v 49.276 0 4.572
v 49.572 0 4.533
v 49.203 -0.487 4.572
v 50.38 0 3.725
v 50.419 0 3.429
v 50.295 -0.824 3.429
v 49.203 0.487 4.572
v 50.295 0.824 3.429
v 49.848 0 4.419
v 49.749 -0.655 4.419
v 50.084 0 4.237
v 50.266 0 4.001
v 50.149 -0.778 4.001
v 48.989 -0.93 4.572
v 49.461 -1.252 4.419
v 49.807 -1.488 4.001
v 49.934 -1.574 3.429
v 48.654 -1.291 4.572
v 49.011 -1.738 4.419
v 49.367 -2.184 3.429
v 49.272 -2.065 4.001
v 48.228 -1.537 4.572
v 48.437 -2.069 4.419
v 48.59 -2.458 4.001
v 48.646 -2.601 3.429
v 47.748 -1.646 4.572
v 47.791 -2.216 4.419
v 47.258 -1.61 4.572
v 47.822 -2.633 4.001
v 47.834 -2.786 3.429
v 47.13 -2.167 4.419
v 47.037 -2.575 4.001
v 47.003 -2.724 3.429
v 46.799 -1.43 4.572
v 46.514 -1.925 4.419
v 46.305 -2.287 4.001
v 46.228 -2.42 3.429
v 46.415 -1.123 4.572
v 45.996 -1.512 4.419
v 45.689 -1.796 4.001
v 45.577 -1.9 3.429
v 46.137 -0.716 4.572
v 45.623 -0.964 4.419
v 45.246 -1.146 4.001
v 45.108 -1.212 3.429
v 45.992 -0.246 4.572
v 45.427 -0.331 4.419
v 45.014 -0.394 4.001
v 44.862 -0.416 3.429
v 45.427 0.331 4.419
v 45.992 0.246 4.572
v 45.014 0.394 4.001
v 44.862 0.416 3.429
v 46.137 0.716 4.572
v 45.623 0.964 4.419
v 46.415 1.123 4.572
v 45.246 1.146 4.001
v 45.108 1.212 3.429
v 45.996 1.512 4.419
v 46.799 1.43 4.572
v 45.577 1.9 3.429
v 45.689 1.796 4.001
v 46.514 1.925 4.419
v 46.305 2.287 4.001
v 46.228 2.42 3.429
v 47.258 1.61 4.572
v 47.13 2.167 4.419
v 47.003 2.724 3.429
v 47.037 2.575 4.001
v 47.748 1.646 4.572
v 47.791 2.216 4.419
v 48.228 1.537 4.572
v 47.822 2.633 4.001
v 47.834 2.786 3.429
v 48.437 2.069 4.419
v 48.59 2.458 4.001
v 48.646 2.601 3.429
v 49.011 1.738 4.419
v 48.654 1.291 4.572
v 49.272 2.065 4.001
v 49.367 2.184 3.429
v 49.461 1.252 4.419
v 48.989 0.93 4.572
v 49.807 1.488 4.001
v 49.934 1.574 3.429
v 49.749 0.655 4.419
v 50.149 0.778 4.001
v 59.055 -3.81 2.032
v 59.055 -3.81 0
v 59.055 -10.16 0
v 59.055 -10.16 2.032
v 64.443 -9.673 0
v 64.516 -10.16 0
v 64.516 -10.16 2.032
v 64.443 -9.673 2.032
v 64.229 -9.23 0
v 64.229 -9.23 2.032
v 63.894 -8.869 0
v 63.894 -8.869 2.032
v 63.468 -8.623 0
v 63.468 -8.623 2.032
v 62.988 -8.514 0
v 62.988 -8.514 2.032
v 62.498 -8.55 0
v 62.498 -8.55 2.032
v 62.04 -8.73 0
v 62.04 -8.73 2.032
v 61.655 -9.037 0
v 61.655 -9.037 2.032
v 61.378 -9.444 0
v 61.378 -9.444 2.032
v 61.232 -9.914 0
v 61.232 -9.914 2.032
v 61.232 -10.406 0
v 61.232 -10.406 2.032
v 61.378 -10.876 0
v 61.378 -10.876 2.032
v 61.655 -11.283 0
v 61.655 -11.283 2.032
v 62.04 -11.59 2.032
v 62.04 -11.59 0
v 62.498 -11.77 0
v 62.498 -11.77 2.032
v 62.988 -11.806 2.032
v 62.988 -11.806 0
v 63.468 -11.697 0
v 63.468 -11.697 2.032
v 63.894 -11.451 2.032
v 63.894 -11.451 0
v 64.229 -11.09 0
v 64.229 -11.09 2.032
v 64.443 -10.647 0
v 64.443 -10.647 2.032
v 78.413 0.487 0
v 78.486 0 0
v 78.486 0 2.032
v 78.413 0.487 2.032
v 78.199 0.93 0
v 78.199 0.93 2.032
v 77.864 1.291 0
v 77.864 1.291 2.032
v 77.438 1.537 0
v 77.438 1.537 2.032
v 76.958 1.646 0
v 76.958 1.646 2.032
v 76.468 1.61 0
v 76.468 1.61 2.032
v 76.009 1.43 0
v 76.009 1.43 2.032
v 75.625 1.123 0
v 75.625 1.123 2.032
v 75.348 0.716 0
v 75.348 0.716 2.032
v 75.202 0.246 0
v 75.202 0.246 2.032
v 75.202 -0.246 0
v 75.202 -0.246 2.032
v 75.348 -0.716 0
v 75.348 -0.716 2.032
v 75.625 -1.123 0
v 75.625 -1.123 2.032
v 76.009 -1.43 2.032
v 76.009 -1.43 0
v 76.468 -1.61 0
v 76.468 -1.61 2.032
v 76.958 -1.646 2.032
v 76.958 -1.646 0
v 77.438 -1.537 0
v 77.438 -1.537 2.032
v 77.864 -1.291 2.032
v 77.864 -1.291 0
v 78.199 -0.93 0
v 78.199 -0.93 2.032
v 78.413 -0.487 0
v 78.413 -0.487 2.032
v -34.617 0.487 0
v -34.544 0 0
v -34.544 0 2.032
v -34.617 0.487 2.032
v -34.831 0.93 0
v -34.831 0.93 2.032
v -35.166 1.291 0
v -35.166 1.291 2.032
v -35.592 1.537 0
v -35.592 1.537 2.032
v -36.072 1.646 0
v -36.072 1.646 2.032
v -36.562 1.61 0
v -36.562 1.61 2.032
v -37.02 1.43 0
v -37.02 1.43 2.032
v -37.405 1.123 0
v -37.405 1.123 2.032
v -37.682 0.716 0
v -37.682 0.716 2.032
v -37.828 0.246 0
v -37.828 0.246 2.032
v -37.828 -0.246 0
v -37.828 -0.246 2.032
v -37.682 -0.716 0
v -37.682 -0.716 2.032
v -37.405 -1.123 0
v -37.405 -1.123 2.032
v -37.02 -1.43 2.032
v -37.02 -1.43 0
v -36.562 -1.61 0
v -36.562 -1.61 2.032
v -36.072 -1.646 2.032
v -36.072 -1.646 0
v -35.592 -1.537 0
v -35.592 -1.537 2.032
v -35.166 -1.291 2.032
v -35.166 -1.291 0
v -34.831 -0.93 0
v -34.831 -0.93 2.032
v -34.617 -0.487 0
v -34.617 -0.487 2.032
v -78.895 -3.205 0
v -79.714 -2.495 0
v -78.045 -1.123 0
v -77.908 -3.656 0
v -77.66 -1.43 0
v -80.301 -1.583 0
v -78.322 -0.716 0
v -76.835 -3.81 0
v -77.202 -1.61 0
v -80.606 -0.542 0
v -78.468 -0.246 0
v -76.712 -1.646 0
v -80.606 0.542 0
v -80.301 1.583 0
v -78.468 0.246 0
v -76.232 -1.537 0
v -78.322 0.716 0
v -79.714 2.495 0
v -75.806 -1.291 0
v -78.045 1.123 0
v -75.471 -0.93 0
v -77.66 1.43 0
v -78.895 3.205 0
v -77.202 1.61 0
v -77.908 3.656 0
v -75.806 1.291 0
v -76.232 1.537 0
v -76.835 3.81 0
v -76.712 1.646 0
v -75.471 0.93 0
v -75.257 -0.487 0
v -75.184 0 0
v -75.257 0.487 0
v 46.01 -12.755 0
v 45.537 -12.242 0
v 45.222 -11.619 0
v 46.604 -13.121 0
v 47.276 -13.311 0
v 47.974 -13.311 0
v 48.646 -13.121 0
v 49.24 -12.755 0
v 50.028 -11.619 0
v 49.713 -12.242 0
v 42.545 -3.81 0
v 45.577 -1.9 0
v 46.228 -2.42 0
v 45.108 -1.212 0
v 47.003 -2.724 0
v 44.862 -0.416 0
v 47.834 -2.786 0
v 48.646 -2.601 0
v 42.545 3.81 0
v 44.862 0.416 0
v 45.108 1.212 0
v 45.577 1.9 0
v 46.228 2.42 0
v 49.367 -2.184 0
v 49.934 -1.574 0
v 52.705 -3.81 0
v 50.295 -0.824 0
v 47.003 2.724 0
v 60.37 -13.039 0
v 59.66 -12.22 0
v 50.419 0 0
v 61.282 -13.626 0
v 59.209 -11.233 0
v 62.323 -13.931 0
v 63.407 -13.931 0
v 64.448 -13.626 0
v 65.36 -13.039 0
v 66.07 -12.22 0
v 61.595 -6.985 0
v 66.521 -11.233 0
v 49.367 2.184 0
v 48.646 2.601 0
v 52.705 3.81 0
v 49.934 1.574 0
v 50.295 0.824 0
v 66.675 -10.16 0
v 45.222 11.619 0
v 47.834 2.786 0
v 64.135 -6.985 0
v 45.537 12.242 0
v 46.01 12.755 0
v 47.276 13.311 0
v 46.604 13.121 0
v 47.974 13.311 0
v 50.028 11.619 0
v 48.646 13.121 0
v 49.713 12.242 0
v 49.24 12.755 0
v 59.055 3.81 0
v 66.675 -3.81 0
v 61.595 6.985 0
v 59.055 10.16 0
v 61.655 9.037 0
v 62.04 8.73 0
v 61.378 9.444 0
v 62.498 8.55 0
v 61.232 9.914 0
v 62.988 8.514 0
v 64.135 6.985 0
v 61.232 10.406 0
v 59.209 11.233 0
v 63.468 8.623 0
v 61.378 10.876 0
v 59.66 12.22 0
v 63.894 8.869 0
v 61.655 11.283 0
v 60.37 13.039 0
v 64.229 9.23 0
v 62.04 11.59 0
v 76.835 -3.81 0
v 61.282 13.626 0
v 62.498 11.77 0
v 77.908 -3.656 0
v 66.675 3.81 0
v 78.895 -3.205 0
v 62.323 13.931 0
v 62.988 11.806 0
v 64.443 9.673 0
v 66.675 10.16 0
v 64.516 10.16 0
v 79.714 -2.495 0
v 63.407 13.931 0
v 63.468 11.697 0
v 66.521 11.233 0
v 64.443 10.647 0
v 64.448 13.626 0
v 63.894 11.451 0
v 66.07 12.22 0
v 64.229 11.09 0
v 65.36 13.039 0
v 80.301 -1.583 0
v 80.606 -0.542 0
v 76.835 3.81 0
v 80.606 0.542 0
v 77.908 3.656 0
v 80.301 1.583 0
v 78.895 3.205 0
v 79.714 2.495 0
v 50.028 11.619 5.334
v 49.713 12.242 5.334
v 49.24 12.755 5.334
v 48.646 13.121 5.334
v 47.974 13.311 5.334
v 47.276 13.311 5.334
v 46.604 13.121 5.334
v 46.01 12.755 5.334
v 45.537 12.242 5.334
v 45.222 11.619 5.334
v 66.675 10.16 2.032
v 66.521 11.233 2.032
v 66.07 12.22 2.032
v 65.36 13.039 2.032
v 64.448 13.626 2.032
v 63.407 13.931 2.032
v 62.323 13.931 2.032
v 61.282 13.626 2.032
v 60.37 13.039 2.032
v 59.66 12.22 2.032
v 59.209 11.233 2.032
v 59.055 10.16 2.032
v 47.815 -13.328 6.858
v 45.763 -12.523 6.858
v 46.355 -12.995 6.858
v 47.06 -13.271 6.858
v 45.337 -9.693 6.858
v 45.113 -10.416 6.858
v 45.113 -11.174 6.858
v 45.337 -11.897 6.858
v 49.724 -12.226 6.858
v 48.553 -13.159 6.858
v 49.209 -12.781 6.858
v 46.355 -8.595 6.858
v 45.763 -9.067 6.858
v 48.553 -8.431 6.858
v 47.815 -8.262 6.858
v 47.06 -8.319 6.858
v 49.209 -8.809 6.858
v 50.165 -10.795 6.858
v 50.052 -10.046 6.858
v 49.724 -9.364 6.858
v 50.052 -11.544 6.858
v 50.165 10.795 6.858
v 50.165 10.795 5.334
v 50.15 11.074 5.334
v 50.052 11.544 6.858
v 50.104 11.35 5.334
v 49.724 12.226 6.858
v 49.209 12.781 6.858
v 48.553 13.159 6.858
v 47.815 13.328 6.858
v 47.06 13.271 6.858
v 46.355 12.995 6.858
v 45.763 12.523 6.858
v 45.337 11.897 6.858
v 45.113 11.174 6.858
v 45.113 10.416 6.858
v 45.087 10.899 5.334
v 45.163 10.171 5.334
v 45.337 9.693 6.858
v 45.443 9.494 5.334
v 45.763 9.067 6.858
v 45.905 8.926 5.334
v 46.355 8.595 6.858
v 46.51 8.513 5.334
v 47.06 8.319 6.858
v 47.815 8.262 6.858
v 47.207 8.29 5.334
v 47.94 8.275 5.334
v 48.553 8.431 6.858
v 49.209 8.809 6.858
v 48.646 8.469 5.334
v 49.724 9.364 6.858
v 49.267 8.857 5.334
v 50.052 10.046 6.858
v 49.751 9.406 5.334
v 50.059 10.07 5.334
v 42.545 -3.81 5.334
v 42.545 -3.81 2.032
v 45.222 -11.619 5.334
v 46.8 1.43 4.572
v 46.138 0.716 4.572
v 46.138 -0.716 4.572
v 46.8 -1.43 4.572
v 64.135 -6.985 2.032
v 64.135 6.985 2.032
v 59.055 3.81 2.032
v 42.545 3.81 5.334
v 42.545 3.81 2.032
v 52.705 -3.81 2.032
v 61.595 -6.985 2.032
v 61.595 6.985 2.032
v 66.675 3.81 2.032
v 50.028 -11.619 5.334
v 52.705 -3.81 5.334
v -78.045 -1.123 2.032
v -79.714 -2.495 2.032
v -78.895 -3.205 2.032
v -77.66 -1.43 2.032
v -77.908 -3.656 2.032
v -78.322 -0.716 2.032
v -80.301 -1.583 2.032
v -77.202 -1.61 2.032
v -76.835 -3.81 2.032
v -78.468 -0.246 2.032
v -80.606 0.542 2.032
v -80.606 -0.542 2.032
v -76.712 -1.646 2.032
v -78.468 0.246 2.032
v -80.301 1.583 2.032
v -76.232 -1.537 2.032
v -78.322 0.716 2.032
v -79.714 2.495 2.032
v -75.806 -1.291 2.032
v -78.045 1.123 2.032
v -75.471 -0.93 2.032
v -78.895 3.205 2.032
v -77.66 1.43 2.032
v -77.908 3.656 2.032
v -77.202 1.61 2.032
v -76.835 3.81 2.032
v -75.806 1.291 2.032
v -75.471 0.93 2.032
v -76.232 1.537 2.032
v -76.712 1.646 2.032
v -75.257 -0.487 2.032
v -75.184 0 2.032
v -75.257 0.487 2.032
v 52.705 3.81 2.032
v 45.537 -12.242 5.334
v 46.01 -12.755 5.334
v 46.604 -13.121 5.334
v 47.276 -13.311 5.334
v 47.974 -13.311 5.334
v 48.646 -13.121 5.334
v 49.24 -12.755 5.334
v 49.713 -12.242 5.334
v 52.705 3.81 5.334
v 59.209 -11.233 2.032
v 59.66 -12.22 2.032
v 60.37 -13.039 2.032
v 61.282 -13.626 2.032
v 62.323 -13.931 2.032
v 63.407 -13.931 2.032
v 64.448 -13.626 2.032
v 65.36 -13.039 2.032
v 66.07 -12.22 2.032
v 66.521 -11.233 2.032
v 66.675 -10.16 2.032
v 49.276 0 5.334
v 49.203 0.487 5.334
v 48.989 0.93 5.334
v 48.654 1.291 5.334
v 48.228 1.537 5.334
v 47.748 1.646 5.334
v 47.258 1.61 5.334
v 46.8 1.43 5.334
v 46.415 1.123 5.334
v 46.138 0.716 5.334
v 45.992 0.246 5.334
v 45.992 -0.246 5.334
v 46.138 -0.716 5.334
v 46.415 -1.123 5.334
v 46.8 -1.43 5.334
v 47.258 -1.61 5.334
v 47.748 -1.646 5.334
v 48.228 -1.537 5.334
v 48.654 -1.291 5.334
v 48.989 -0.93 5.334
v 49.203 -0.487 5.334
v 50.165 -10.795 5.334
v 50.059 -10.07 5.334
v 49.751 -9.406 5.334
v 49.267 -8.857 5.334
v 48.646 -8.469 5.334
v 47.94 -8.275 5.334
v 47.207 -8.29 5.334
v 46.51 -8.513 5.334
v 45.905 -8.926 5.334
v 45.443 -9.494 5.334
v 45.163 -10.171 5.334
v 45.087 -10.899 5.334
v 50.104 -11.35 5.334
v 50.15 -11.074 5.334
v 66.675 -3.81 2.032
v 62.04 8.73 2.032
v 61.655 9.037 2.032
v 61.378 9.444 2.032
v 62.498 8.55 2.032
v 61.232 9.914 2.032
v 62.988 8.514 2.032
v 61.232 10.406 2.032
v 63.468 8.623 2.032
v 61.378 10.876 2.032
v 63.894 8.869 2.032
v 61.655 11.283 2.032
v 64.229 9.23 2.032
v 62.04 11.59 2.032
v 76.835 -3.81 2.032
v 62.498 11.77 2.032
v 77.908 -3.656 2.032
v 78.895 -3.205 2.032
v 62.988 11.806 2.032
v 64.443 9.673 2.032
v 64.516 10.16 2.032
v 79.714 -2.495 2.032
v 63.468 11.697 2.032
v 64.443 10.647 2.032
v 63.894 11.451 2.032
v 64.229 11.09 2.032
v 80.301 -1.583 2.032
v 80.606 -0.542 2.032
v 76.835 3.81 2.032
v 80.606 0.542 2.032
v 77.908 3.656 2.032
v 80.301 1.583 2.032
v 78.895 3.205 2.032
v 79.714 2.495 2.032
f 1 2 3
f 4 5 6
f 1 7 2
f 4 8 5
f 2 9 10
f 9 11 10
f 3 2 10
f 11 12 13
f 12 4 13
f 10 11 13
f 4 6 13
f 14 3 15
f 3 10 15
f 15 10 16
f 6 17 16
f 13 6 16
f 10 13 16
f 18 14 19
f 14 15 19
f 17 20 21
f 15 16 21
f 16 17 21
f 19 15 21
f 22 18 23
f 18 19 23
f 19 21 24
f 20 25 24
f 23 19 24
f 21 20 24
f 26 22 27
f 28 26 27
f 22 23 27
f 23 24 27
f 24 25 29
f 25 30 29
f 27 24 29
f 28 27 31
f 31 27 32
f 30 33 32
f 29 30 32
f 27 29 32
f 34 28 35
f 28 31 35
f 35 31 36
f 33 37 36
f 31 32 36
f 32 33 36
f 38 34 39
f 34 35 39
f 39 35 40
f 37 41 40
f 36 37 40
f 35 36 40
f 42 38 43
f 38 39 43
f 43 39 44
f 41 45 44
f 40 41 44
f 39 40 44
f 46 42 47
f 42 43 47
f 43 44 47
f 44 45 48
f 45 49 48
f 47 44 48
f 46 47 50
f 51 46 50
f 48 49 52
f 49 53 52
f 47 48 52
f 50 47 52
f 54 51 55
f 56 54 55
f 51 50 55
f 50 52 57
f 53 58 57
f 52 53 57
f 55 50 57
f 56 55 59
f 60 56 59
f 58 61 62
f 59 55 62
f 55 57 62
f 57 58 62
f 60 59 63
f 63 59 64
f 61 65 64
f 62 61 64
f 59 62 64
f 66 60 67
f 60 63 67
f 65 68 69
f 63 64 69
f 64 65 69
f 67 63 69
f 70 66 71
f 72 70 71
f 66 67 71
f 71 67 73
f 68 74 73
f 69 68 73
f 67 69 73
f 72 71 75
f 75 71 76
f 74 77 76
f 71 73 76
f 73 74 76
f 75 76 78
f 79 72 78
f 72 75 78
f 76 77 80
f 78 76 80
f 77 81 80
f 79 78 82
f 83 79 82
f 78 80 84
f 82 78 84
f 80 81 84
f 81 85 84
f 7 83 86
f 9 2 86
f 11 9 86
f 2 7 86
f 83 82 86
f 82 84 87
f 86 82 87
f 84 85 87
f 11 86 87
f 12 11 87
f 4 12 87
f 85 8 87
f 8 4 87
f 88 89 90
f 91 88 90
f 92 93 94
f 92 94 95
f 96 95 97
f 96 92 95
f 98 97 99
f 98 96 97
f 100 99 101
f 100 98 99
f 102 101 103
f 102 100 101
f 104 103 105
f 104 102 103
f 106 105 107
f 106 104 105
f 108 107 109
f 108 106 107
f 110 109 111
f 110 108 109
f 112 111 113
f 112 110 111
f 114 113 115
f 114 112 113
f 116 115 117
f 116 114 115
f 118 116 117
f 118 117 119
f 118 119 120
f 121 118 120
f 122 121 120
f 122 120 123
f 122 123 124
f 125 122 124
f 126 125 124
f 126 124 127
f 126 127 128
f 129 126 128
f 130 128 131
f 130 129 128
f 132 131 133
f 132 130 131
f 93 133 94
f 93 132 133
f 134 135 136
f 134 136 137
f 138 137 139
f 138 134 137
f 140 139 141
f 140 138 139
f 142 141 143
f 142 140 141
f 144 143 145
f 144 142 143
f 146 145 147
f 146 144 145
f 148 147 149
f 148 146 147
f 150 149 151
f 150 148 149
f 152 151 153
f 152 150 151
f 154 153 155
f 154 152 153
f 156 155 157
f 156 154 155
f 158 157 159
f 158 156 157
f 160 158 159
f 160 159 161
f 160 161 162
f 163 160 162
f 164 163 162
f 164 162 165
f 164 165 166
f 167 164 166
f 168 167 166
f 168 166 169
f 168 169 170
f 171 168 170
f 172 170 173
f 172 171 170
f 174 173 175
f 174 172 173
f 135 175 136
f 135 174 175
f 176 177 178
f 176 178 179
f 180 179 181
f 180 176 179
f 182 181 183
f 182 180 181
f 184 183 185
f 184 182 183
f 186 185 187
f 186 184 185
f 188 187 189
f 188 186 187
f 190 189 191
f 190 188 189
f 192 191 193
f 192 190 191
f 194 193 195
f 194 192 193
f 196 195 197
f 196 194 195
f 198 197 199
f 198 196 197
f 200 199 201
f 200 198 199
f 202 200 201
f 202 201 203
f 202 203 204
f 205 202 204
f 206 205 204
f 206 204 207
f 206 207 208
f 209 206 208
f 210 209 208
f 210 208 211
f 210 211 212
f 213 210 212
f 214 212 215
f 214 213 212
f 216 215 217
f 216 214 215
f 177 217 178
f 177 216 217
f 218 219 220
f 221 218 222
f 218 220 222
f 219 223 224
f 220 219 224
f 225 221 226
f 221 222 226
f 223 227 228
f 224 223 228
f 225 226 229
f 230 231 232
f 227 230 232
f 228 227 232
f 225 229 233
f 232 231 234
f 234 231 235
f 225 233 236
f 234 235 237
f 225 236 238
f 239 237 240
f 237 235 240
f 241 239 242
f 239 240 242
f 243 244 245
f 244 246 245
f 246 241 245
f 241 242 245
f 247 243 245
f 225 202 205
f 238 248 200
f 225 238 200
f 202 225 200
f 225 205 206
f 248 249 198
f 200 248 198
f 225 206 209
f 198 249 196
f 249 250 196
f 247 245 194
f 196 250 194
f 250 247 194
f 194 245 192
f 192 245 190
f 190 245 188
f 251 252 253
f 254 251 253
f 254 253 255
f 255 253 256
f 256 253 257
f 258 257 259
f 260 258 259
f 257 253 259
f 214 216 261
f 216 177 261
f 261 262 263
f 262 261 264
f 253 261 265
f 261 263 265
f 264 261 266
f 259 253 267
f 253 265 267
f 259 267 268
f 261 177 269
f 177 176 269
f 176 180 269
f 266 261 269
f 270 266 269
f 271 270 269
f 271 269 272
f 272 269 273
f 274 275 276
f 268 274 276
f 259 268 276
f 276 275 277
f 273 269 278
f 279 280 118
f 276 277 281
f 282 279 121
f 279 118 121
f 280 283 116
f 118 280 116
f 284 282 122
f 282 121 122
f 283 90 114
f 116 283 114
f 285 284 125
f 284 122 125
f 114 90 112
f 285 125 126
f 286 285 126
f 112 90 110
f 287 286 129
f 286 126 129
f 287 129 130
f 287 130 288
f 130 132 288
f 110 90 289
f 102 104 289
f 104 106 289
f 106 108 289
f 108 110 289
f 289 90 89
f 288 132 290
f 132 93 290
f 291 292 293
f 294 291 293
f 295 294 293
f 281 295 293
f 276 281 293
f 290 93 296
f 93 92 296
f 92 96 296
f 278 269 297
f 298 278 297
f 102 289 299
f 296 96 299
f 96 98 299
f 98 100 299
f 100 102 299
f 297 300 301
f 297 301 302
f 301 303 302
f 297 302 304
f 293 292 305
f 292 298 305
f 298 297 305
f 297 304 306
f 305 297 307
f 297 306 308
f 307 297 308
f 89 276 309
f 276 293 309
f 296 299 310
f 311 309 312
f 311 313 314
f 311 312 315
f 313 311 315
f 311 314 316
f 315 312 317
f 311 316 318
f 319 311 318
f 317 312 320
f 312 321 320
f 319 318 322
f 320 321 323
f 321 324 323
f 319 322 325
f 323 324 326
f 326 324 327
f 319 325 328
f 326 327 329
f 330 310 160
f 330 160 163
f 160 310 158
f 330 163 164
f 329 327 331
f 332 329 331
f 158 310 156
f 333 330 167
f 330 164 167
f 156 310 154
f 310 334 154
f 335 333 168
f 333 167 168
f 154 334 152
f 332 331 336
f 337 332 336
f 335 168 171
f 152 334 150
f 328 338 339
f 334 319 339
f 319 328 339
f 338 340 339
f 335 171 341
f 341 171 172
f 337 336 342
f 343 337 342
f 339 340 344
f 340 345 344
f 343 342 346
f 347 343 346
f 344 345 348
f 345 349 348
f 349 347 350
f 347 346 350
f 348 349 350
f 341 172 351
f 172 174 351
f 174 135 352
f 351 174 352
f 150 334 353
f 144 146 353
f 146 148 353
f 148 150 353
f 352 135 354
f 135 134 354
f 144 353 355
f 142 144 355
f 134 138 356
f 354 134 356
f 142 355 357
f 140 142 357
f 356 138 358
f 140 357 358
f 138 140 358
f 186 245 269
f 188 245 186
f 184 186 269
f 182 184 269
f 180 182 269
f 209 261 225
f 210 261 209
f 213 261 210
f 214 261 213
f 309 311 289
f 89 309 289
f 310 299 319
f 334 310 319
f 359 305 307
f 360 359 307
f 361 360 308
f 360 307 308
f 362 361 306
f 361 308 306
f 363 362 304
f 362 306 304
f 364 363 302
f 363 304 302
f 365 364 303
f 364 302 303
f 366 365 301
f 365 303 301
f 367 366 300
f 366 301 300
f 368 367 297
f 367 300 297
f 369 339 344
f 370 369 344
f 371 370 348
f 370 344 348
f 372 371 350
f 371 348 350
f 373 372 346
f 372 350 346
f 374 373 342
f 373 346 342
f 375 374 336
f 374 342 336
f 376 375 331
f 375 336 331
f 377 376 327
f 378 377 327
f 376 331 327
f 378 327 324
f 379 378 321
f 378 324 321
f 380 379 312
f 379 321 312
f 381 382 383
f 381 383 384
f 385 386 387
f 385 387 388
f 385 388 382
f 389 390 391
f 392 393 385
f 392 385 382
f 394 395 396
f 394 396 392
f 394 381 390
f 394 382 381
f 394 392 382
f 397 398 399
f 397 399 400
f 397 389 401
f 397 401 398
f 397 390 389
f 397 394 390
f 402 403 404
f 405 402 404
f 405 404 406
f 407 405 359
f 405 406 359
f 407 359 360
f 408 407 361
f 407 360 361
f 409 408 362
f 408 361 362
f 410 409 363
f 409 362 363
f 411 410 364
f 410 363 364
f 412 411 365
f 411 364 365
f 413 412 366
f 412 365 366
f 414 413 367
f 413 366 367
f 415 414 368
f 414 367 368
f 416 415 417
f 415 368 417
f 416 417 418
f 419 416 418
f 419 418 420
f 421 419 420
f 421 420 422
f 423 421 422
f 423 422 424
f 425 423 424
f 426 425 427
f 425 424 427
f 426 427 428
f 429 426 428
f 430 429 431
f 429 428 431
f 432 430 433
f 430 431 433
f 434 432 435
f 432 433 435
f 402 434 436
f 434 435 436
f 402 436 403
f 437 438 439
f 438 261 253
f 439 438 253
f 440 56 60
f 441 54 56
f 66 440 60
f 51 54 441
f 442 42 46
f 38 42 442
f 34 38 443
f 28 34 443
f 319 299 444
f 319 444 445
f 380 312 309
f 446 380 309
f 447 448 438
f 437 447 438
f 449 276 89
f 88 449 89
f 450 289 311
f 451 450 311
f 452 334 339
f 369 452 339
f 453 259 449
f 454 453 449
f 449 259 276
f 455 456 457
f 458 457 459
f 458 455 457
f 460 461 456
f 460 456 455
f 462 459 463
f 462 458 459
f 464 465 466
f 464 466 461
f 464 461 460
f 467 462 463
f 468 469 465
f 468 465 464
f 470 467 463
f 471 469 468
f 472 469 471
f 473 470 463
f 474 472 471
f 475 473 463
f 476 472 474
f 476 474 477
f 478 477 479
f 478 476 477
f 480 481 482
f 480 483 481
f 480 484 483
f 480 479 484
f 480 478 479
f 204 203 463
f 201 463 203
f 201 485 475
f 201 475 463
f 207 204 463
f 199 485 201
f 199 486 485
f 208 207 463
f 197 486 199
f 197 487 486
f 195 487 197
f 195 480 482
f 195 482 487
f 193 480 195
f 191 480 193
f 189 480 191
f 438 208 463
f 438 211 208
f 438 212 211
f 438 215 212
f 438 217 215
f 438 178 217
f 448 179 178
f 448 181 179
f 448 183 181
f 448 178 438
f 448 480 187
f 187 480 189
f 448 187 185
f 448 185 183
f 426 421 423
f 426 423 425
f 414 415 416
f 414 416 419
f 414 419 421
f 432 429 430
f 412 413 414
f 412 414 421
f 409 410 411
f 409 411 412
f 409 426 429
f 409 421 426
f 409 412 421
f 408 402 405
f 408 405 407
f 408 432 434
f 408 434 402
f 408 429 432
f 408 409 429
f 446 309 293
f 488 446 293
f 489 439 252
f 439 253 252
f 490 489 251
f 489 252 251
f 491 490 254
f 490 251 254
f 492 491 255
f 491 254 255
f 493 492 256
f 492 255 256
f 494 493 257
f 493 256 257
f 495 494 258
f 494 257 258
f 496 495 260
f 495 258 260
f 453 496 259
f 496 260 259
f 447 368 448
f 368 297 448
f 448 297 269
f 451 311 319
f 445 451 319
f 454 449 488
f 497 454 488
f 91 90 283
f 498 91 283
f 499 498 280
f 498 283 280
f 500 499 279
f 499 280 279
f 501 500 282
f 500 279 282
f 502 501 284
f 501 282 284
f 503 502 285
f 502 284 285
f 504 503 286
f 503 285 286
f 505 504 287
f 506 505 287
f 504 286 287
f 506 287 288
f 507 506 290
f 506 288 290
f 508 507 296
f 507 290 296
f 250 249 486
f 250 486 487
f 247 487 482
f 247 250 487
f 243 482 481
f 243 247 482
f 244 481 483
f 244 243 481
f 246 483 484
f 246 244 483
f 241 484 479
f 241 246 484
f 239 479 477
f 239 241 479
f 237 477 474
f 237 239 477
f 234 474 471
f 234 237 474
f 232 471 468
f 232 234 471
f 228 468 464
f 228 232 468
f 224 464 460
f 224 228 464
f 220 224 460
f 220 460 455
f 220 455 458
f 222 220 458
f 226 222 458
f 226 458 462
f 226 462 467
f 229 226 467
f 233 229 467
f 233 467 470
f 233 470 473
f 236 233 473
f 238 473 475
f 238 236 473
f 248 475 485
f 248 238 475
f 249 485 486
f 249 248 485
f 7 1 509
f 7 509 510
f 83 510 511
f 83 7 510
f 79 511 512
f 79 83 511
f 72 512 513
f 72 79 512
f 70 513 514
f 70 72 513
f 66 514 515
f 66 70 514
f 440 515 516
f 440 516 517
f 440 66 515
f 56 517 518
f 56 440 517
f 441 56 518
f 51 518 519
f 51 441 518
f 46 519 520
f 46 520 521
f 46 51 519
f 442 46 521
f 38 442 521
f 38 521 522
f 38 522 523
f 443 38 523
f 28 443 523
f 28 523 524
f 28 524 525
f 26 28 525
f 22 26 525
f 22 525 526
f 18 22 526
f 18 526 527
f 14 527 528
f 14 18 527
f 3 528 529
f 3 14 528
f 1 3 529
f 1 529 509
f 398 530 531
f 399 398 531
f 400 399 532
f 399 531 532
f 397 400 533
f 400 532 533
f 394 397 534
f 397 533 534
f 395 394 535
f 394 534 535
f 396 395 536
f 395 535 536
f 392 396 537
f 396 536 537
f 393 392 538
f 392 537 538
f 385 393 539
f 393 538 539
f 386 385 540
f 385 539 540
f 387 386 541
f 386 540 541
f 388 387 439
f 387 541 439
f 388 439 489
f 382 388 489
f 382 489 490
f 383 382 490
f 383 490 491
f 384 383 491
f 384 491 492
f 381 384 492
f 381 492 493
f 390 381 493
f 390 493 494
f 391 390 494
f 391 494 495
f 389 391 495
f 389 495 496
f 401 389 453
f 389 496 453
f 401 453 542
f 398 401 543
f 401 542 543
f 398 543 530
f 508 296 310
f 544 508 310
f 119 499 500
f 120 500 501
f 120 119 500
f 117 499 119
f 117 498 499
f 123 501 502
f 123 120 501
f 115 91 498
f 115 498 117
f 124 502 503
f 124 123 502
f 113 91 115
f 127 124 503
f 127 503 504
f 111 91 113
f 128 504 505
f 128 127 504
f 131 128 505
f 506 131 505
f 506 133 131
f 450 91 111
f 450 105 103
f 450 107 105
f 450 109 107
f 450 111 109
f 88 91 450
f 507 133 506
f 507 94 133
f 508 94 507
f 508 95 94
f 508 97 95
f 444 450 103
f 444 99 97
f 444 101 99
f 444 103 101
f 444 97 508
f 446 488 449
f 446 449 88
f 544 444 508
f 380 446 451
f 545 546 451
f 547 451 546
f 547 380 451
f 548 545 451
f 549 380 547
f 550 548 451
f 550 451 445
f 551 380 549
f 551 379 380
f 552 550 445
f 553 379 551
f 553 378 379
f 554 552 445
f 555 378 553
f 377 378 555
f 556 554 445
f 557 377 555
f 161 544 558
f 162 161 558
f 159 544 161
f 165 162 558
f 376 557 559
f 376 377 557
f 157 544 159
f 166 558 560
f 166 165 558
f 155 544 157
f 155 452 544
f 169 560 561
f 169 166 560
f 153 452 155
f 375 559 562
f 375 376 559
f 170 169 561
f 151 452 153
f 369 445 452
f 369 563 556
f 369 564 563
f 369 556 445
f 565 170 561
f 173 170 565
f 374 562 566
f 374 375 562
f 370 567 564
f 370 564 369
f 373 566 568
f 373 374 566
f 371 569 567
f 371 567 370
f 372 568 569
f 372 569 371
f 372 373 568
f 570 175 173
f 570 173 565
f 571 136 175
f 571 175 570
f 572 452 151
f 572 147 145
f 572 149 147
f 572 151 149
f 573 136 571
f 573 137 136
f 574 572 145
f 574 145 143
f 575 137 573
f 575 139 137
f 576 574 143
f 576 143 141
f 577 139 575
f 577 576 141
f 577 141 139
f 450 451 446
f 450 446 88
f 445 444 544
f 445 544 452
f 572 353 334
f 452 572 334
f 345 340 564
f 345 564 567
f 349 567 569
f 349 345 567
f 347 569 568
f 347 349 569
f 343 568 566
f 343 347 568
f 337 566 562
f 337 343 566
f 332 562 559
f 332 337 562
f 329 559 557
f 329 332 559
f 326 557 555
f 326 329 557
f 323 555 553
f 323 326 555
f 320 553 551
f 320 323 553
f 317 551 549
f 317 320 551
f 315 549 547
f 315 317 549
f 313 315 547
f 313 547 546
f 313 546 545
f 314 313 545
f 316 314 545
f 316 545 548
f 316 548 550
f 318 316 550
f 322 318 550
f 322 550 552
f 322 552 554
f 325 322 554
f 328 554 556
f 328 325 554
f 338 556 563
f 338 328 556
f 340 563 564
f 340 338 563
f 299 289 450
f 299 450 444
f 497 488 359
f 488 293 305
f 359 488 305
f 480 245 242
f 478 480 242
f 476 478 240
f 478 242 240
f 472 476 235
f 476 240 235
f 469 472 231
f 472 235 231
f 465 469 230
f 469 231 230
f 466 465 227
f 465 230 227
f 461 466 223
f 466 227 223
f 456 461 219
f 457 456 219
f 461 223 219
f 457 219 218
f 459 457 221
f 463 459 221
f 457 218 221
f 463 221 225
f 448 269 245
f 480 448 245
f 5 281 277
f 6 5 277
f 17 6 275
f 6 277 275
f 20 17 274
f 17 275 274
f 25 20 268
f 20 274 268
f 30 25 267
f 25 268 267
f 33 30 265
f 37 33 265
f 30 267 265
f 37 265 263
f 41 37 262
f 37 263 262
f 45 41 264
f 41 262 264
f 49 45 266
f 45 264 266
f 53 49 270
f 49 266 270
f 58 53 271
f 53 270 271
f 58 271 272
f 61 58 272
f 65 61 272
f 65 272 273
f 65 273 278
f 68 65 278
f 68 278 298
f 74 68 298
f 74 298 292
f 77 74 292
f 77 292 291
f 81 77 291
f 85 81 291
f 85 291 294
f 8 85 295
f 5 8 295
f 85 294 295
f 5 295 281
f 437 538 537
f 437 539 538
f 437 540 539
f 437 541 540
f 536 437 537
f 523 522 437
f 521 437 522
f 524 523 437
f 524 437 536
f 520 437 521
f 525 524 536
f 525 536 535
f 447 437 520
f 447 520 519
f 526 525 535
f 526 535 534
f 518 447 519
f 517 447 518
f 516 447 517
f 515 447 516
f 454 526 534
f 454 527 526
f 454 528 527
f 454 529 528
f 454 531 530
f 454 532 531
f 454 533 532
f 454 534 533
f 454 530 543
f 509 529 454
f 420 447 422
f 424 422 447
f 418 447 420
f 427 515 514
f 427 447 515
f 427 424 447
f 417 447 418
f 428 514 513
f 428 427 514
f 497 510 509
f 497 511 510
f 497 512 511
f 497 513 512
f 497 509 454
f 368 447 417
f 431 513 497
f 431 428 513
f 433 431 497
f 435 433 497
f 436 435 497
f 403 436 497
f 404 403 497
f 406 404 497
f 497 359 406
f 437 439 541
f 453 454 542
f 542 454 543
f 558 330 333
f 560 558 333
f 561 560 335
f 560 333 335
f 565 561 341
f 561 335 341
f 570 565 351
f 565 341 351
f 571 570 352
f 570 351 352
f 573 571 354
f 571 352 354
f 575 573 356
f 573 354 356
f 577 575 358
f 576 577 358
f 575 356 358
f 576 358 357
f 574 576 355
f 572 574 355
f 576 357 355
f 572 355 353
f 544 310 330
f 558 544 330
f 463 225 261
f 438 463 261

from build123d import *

# Parameters (mm, degrees)
F0_R     = 1.651
F0_W     = 2.54
F0_H     = 13.97
F1_DEPTH = 2.032
F2_R     = 1.651
F3_DEPTH = 3.302
F4_R     = 2.54
F5_DEPTH = 1.524
F6_R     = 2.794
F7_DEPTH = 4.572
F8_R     = 1.14299


# Not quite as in the source:
# - a fillet or chamfer is up to 0.001 mm smaller than in the source, because OpenCascade refuses the exact size


with BuildPart() as f1:
    # F0 (on Top) → F1 (new body)
    with BuildSketch(Plane.XY):
        with BuildLine():
            Line((42.545, 3.81), (-76.835, 3.81))
            ThreePointArc((-76.835, 3.81), (-80.645, 0), (-76.835, -3.81))
            Line((-76.835, -3.81), (42.545, -3.81))
            Line((42.545, -3.81), (45.2222972973, -11.6187837838))
            ThreePointArc((45.2222972973, -11.6187837838), (47.625, -13.335), (50.0277027027, -11.6187837838))
            Line((50.0277027027, -11.6187837838), (52.705, -3.81))
            Line((52.705, -3.81), (59.055, -3.81))
            Line((59.055, -3.81), (59.055, -10.16))
            ThreePointArc((59.055, -10.16), (62.865, -13.97), (66.675, -10.16))
            Line((66.675, -10.16), (66.675, -3.81))
            Line((66.675, -3.81), (76.835, -3.81))
            ThreePointArc((76.835, -3.81), (80.645, 0), (76.835, 3.81))
            Line((76.835, 3.81), (66.675, 3.81))
            Line((66.675, 3.81), (66.675, 10.16))
            ThreePointArc((66.675, 10.16), (62.865, 13.97), (59.055, 10.16))
            Line((59.055, 10.16), (59.055, 3.81))
            Line((59.055, 3.81), (52.705, 3.81))
            Line((52.705, 3.81), (50.0277027027, 11.6187837838))
            ThreePointArc((50.0277027027, 11.6187837838), (47.625, 13.335), (45.2222972973, 11.6187837838))
            Line((45.2222972973, 11.6187837838), (42.545, 3.81))
        make_face()
        with Locations((-76.835, 0)):
            Circle(F0_R, mode=Mode.SUBTRACT)
        with Locations((-36.195, 0)):
            Circle(F0_R, mode=Mode.SUBTRACT)
        with Locations((62.865, -10.16)):
            Circle(F0_R, mode=Mode.SUBTRACT)
        with Locations((47.625, 0)):
            Circle(F0_R, mode=Mode.SUBTRACT)
        with Locations((62.865, 0)):
            Rectangle(F0_W, F0_H, mode=Mode.SUBTRACT)
        with Locations((76.835, 0)):
            Circle(F0_R, mode=Mode.SUBTRACT)
        with Locations((62.865, 10.16)):
            Circle(F0_R, mode=Mode.SUBTRACT)
    extrude(amount=F1_DEPTH)

    # F2 (on face) → F3 (join)
    with BuildSketch(Plane.XY.offset(2.032)):
        with BuildLine():
            ThreePointArc((50.0277027027, 11.6187837838), (47.625, 13.335), (45.2222972973, 11.6187837838))
            Line((45.2222972973, 11.6187837838), (42.545, 3.81))
            Line((42.545, 3.81), (42.545, -3.81))
            Line((42.545, -3.81), (45.2222972973, -11.6187837838))
            ThreePointArc((45.2222972973, -11.6187837838), (47.625, -13.335), (50.0277027027, -11.6187837838))
            Line((50.0277027027, -11.6187837838), (52.705, -3.81))
            Line((52.705, -3.81), (52.705, 3.81))
            Line((52.705, 3.81), (50.0277027027, 11.6187837838))
        make_face()
        with Locations((47.625, 0)):
            Circle(F2_R, mode=Mode.SUBTRACT)
    extrude(amount=F3_DEPTH)

    # F4 (on face) → F5 (join)
    with BuildSketch(Plane.XY.offset(5.334)):
        with Locations((47.625, 10.795)):
            Circle(F4_R)
        with Locations((47.625, -10.795)):
            Circle(F4_R)
    extrude(amount=F5_DEPTH)

    # F6 (on face) → F7 (cut)
    with BuildSketch(Plane(origin=(0, 0, 0), x_dir=(1, 0, 0), z_dir=(0, 0, -1))):
        with Locations((47.625, 0)):
            Circle(F6_R)
    extrude(amount=-F7_DEPTH, mode=Mode.SUBTRACT)

    # F8 (radius 1.143 in the source; OpenCascade refuses exactly that, so slightly less here)
    f8_edges = [f1.edges().sort_by_distance(p)[0] for p in [
        (44.831, 0, 4.572),
    ]]
    fillet(f8_edges, radius=F8_R)


solid = f1.part
